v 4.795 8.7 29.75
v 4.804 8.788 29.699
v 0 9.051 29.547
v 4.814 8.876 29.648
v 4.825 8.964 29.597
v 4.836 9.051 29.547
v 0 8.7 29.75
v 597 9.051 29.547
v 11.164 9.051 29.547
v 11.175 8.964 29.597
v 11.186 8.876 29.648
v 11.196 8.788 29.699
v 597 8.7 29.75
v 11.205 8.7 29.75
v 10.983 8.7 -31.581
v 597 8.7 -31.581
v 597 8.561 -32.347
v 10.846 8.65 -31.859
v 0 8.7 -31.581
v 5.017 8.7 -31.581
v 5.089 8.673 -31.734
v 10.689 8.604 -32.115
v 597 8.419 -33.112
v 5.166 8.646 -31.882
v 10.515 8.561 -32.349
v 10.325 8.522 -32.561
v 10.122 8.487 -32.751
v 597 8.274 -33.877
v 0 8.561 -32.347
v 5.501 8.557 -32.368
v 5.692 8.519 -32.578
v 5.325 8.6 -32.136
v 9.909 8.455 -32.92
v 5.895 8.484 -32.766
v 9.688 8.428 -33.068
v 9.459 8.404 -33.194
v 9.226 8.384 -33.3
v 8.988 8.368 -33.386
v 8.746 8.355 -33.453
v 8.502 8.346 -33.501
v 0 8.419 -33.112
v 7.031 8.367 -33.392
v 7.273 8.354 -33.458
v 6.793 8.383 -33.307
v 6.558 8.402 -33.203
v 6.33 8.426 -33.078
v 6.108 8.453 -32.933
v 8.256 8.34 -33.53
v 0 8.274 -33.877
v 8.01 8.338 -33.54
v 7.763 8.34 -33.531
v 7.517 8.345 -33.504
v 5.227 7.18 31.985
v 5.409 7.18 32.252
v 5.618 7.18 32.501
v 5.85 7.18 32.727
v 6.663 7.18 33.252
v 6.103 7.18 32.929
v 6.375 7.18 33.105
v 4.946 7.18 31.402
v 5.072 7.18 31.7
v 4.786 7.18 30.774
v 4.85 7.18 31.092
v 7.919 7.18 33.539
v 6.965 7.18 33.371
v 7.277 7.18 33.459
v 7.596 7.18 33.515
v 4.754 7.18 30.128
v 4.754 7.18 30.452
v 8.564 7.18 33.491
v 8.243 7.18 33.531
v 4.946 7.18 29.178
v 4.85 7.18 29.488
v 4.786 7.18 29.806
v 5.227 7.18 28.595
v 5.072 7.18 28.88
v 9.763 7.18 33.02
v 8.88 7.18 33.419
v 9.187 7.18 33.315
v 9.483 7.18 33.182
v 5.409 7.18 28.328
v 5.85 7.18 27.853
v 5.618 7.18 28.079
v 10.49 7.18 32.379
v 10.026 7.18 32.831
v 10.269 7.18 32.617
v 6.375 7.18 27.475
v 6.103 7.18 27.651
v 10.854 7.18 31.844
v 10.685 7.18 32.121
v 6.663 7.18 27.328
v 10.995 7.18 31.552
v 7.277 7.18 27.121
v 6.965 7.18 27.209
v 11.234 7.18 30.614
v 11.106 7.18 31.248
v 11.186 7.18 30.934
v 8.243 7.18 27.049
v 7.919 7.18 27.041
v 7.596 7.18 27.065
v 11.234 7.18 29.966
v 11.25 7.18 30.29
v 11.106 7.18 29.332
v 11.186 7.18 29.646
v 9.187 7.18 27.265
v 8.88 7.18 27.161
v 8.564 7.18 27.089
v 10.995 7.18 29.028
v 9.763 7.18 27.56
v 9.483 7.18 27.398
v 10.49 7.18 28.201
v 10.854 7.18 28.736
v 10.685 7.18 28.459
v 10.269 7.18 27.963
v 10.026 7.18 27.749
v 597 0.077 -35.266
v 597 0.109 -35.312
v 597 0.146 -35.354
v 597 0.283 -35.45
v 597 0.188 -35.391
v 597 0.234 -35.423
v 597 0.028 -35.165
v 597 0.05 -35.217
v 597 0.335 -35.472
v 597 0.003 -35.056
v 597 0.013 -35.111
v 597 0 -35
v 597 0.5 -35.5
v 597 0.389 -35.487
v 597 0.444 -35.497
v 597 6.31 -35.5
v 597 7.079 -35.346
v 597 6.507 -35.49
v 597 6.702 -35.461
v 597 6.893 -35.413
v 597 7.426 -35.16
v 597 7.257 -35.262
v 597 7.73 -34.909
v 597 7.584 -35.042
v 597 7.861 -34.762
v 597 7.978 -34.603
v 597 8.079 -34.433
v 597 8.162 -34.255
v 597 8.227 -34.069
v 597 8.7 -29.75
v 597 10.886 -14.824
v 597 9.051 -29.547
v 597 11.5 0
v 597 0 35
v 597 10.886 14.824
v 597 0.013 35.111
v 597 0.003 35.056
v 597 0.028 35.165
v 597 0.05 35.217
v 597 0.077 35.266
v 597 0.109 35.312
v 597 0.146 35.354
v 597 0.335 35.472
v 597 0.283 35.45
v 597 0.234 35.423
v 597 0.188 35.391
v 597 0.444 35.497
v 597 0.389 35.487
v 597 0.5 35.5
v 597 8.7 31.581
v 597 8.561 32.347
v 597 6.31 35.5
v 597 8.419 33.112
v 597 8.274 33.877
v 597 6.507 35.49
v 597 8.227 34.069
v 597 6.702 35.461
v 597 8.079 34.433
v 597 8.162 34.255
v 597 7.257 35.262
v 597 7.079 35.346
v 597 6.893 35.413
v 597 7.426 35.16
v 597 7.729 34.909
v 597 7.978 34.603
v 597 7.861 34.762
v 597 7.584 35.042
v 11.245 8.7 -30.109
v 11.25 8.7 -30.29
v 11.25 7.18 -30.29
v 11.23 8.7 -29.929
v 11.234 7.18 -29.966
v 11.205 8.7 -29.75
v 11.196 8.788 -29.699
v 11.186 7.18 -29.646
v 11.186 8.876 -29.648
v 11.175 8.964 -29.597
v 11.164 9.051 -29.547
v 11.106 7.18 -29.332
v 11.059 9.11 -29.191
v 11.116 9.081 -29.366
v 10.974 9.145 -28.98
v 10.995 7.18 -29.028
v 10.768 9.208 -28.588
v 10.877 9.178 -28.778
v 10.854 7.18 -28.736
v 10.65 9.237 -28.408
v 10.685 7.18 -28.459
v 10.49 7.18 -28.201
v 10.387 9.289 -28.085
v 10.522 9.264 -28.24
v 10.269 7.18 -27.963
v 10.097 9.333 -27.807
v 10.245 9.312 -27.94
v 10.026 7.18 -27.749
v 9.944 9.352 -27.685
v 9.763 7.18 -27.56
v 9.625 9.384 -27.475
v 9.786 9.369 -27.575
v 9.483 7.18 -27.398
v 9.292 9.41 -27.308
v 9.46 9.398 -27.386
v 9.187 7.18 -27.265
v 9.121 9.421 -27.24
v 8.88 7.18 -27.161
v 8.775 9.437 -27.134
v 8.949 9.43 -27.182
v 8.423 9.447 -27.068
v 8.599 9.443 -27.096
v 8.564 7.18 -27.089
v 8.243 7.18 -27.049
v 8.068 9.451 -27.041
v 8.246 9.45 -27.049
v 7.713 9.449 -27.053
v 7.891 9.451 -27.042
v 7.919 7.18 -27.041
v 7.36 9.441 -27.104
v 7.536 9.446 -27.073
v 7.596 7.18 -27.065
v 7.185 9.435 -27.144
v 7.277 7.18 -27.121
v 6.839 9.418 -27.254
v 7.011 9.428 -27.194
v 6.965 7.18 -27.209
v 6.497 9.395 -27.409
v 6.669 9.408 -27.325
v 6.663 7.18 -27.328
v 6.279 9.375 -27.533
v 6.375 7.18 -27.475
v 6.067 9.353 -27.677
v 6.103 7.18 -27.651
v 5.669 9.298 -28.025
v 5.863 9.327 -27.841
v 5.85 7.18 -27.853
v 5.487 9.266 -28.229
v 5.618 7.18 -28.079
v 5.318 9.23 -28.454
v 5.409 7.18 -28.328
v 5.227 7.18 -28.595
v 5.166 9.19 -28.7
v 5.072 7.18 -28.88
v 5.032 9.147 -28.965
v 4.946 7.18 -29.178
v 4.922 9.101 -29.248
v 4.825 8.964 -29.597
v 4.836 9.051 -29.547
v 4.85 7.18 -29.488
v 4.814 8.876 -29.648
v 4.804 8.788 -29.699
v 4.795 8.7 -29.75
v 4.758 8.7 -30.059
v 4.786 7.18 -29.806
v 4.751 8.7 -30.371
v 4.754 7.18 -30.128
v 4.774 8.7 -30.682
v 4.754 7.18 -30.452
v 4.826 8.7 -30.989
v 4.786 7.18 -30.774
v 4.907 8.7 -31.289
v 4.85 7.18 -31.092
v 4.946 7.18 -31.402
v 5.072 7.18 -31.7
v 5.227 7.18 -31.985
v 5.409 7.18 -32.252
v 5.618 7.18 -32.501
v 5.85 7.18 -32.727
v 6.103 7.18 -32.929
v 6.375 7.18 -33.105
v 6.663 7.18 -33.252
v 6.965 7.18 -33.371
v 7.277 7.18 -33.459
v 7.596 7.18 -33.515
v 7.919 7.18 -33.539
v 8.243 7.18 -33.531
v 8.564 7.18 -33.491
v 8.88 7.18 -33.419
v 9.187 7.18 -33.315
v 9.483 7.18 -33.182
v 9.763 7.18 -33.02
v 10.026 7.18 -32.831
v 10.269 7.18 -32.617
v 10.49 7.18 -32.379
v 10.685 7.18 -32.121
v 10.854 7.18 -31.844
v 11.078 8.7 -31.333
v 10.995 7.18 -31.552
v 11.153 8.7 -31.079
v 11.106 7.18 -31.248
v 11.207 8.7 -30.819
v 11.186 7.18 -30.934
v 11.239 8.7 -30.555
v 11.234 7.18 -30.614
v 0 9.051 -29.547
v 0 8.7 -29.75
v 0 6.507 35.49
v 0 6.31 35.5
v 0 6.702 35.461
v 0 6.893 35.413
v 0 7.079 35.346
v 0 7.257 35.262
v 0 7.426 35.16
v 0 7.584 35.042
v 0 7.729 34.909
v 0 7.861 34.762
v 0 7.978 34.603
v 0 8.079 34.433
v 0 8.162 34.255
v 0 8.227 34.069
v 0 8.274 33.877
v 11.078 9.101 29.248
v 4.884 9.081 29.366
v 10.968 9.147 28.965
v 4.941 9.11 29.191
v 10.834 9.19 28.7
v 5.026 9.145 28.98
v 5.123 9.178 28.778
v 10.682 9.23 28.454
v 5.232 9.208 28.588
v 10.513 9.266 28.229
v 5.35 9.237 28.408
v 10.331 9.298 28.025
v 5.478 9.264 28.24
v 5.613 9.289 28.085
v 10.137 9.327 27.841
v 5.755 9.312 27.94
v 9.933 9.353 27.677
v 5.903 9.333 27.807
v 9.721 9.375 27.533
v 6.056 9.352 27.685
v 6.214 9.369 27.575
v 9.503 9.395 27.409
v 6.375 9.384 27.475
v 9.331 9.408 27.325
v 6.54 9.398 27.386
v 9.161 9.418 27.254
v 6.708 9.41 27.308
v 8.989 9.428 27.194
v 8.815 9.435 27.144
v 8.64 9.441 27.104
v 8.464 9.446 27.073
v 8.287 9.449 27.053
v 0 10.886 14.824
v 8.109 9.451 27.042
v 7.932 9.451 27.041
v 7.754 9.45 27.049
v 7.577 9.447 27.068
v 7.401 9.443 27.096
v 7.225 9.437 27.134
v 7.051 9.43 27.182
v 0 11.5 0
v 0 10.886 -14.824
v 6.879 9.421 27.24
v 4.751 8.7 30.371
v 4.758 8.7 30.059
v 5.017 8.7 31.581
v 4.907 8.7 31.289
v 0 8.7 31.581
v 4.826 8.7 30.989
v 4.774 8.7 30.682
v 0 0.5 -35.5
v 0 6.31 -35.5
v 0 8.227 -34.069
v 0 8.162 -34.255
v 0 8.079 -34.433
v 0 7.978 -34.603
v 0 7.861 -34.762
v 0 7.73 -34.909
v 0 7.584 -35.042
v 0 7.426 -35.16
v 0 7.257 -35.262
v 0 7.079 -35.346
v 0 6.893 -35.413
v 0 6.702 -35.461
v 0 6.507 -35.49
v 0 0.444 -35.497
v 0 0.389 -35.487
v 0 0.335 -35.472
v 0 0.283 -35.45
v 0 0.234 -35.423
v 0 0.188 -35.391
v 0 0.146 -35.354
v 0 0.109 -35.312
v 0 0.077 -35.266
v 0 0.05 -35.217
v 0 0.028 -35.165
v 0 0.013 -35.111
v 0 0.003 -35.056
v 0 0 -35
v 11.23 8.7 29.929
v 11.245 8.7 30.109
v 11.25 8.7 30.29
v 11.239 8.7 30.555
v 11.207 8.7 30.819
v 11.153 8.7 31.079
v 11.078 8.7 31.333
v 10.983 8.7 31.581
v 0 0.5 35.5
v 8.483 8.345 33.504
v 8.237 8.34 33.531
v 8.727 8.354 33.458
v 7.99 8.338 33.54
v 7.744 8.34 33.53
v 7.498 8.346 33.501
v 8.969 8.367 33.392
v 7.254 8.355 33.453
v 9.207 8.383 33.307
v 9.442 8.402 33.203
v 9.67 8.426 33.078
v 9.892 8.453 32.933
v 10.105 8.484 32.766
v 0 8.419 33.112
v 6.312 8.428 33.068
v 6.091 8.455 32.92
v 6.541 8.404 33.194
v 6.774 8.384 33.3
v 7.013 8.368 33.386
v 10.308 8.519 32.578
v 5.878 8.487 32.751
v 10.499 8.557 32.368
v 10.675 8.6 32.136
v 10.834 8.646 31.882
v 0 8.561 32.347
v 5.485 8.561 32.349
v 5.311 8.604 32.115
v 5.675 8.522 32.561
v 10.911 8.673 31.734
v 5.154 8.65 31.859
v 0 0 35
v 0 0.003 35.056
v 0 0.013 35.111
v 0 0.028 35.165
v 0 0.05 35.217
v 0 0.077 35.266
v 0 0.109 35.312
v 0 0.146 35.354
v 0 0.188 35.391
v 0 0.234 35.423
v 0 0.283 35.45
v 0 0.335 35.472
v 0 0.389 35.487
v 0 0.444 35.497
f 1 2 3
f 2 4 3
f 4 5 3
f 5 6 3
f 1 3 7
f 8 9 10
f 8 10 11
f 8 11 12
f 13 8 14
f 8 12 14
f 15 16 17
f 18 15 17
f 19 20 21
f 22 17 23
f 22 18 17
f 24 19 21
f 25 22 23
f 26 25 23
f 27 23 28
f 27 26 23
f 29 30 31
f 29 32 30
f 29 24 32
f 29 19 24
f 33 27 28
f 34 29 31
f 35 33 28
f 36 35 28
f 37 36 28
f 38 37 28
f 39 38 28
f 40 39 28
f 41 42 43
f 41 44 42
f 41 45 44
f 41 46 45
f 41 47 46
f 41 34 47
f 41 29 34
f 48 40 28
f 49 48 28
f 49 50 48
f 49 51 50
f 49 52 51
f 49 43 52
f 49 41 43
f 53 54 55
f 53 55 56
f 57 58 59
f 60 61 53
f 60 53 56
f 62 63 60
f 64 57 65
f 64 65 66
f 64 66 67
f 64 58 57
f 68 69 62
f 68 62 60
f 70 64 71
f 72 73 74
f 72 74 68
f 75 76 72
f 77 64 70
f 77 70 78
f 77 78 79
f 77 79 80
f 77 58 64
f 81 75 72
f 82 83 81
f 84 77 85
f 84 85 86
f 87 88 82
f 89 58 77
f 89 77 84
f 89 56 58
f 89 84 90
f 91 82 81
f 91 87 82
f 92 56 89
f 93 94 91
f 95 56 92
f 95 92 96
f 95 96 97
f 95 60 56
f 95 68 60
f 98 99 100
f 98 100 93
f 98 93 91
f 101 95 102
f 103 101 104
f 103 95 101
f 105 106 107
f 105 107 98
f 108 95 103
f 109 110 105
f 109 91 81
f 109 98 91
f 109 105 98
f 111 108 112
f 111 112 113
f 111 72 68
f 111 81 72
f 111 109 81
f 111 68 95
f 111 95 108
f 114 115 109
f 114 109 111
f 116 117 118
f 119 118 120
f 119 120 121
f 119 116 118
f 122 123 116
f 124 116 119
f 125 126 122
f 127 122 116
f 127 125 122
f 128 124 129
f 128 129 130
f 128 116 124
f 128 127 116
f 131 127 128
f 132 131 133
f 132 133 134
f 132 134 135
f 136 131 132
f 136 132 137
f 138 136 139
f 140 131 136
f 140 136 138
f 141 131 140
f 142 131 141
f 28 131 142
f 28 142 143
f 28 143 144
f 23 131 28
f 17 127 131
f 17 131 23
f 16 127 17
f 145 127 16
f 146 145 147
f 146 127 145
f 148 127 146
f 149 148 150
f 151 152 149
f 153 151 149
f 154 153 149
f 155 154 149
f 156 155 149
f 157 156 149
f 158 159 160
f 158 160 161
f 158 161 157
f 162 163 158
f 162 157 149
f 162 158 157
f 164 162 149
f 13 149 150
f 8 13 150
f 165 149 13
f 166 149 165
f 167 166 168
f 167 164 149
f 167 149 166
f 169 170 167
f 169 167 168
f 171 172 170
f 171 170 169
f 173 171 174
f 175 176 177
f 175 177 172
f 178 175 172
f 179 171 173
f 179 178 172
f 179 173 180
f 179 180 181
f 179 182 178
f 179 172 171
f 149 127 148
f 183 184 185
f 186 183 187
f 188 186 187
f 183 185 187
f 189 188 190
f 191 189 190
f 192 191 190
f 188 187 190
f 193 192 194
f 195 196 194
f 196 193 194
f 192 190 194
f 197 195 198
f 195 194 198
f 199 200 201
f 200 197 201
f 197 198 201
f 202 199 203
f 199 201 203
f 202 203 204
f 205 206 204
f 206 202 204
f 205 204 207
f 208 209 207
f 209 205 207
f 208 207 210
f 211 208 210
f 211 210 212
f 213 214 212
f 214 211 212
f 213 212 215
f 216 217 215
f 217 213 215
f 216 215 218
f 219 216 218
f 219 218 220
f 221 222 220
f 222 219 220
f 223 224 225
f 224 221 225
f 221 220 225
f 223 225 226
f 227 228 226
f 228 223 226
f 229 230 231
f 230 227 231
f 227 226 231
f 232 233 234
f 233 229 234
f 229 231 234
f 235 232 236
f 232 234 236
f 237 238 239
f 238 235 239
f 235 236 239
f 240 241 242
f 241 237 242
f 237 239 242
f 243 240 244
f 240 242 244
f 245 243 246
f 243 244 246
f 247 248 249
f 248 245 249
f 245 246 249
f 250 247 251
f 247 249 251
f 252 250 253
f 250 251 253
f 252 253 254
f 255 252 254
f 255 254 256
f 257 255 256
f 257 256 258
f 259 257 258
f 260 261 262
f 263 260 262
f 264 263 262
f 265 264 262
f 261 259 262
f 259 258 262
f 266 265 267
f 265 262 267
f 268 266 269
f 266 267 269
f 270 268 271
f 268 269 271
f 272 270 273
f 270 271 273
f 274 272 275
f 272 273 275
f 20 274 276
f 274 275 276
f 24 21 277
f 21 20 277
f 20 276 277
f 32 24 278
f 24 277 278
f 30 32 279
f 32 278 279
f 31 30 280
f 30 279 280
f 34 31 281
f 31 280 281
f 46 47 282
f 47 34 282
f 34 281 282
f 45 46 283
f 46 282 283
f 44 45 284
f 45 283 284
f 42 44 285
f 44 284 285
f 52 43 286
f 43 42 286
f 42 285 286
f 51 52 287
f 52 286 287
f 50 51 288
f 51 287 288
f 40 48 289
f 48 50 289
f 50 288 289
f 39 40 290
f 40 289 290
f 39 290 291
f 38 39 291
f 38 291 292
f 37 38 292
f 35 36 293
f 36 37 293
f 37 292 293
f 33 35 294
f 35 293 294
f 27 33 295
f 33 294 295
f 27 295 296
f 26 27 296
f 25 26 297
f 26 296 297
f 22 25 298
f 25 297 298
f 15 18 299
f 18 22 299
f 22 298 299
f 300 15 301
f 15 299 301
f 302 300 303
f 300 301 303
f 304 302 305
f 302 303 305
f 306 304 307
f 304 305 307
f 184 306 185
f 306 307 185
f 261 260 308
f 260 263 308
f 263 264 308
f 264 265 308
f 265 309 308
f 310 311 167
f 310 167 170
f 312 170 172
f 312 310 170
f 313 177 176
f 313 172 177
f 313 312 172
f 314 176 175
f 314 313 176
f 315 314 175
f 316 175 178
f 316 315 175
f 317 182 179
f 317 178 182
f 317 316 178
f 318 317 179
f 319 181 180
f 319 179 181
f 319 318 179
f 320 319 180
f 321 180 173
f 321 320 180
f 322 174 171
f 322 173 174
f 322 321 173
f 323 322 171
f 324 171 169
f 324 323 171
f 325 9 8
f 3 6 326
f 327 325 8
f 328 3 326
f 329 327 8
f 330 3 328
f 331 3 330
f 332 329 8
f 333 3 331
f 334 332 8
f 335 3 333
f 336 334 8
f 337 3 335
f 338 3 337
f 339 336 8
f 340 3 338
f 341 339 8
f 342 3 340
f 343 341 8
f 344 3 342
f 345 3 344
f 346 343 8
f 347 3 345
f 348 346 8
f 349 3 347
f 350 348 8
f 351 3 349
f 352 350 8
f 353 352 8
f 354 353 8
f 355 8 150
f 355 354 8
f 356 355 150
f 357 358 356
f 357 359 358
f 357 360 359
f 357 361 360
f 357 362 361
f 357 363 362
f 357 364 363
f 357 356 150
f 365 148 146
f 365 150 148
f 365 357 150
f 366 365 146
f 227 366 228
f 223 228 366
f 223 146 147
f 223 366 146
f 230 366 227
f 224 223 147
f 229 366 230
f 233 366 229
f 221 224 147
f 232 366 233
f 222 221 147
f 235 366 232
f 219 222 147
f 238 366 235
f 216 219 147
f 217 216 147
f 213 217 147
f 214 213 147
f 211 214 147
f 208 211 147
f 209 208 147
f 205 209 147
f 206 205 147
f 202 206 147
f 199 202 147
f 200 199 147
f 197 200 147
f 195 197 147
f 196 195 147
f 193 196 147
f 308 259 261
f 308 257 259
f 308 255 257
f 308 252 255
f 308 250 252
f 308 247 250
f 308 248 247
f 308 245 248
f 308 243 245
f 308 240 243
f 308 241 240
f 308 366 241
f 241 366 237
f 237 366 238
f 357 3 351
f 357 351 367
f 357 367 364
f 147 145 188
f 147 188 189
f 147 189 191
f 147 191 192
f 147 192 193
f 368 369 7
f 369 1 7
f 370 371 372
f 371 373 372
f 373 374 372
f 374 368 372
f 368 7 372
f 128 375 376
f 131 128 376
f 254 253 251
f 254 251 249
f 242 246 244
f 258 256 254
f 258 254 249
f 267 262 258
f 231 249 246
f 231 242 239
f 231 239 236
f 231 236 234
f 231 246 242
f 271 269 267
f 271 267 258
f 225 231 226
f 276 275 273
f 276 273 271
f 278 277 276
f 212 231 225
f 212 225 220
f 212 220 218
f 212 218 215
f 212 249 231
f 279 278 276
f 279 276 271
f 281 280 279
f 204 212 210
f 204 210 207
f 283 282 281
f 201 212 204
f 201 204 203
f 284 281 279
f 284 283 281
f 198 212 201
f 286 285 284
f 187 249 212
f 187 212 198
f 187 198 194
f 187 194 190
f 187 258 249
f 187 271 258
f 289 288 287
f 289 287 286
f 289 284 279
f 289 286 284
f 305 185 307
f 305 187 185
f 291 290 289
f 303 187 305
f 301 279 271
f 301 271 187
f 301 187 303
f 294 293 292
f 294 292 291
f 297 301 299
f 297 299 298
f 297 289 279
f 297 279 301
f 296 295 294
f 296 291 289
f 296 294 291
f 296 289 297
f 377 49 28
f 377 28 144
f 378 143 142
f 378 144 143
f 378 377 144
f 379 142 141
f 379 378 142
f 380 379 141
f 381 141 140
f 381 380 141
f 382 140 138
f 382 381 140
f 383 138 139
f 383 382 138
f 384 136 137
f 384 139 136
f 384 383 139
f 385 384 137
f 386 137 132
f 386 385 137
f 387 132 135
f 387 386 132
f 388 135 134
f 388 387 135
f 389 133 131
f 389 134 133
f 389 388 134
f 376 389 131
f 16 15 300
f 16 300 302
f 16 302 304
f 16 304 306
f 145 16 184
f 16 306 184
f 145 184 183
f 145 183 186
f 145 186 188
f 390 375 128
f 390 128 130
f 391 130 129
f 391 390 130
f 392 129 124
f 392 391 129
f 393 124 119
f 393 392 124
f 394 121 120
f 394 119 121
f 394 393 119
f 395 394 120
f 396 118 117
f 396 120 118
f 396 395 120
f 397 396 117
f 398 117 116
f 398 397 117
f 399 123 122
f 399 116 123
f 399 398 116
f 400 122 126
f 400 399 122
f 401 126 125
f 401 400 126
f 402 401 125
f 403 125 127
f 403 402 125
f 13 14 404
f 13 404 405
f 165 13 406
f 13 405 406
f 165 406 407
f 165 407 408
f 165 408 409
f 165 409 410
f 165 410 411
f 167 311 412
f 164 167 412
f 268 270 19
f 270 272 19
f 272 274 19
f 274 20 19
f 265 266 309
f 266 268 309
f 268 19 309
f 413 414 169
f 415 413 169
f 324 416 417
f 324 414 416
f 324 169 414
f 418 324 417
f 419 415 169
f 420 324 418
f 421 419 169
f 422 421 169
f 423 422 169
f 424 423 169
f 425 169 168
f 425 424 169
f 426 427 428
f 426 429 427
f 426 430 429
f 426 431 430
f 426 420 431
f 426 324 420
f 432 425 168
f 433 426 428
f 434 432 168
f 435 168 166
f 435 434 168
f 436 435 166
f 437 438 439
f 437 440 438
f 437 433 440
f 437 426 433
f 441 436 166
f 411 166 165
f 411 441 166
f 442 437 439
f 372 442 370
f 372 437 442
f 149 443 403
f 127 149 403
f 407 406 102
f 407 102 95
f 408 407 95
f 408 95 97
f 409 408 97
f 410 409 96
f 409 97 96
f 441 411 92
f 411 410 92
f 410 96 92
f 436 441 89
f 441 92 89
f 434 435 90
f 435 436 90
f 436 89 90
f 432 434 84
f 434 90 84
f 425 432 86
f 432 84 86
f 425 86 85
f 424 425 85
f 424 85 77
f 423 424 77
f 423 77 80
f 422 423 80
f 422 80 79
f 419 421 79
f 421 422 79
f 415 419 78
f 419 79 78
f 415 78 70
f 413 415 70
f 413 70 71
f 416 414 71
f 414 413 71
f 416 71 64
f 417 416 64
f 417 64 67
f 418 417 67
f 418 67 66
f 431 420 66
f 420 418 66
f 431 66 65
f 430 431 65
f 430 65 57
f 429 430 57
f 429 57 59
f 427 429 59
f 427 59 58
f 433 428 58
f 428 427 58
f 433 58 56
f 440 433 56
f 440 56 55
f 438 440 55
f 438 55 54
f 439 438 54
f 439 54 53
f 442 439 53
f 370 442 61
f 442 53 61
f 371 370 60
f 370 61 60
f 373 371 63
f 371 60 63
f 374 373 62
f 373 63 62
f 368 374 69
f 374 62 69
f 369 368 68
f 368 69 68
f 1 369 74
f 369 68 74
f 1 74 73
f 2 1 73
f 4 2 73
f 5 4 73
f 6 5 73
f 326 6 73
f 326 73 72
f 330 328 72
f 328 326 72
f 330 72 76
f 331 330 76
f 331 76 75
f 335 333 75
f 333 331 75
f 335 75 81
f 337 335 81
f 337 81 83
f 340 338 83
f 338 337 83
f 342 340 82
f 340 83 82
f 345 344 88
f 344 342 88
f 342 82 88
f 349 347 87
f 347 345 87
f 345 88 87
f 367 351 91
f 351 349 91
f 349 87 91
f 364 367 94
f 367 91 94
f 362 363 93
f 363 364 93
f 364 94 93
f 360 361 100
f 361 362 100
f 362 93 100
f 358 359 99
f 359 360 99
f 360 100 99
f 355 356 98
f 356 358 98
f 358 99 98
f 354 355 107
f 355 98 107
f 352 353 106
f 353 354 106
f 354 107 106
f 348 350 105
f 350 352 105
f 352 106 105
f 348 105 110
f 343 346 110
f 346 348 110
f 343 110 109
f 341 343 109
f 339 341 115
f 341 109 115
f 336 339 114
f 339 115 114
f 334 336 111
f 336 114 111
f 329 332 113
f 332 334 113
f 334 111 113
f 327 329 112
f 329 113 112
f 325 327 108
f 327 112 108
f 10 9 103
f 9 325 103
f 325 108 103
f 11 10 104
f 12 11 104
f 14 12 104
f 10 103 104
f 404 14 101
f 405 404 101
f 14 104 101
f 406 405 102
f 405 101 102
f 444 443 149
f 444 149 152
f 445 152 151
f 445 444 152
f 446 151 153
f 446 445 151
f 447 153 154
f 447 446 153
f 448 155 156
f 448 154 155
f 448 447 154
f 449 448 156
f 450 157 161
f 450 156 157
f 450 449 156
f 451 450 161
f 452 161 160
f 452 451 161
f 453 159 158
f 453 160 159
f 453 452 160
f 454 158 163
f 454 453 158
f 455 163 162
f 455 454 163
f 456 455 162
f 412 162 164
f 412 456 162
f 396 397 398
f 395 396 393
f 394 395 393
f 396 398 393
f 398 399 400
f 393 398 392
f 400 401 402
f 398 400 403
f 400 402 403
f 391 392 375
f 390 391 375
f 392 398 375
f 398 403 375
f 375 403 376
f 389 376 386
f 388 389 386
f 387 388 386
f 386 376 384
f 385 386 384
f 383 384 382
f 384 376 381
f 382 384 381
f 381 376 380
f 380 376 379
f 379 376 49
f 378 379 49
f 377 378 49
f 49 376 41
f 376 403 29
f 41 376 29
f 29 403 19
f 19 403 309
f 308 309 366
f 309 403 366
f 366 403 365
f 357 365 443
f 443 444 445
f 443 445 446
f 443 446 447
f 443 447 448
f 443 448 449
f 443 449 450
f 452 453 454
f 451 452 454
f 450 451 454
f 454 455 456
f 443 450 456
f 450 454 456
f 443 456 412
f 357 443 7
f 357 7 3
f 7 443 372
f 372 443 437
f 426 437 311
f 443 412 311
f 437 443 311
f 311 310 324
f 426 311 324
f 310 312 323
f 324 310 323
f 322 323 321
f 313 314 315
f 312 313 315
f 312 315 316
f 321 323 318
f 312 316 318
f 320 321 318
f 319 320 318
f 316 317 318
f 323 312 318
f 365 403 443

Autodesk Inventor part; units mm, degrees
sketch "__2" plane through (0, 0, 0) normal (1, 0, 0) x (0, 1, 0)
  arc A0 (0.5, 35.5) -> (0, 35) centre (0.5, 35) ccw
  line L0 (0, 35) -> (0, -35)
  arc A1 (0, -35) -> (0.5, -35.5) centre (0.5, -35) ccw
  line L1 (0.5, -35.5) -> (6.3099, -35.5)
  arc A2 (6.3099, -35.5) -> (8.274, -33.877) centre (6.3099, -33.5) ccw
  arc A3 (8.274, -33.877) -> (8.7, -31.581) centre (-167.9972, 0.0159) ccw
  line L2 (8.7, -31.581) -> (8.7, -29.75)
  line L3 (8.7, -29.75) -> (9.051, -29.547)
  arc A4 (9.051, -29.547) -> (9.051, 29.547) centre (-168.0005, 0) ccw
  line L4 (9.051, 29.547) -> (8.7, 29.75)
  line L5 (8.7, 29.75) -> (8.7, 31.581)
  arc A5 (8.7, 31.581) -> (8.274, 33.877) centre (-167.9972, -0.0159) ccw
  arc A6 (8.274, 33.877) -> (6.3099, 35.5) centre (6.3099, 33.5) ccw
  line L6 (6.3099, 35.5) -> (0.5, 35.5)
extrude "Extrusion1" add sketch "__2" along normal blind 597
sketch "__1" plane through (0, 7.18, 0) normal (0, 1, 0) x (1, 0, 0)
  circle A0 centre (8, 30.29) radius 3.25
extrude "Extrusion2" cut sketch "__1" along normal blind 3.52
pattern_linear "Rectangular Pattern1" count 2 spacing 631 along (1, 0, 0) count 2 spacing 60.58 along (0, 0, 1) of "Extrusion2"
ref_plane "BODYS_XY" through (0, 0, 0) normal (1, 0, 0) x (0, 0, -1)
ref_plane "BODYS_YZ" through (0, 0, 0) normal (0, 0, -1) x (0, 1, 0)
ref_plane "BODYS_ZX" through (0, 0, 0) normal (0, 1, 0) x (1, 0, 0)
properties part number "ETH2-17-350_3"
